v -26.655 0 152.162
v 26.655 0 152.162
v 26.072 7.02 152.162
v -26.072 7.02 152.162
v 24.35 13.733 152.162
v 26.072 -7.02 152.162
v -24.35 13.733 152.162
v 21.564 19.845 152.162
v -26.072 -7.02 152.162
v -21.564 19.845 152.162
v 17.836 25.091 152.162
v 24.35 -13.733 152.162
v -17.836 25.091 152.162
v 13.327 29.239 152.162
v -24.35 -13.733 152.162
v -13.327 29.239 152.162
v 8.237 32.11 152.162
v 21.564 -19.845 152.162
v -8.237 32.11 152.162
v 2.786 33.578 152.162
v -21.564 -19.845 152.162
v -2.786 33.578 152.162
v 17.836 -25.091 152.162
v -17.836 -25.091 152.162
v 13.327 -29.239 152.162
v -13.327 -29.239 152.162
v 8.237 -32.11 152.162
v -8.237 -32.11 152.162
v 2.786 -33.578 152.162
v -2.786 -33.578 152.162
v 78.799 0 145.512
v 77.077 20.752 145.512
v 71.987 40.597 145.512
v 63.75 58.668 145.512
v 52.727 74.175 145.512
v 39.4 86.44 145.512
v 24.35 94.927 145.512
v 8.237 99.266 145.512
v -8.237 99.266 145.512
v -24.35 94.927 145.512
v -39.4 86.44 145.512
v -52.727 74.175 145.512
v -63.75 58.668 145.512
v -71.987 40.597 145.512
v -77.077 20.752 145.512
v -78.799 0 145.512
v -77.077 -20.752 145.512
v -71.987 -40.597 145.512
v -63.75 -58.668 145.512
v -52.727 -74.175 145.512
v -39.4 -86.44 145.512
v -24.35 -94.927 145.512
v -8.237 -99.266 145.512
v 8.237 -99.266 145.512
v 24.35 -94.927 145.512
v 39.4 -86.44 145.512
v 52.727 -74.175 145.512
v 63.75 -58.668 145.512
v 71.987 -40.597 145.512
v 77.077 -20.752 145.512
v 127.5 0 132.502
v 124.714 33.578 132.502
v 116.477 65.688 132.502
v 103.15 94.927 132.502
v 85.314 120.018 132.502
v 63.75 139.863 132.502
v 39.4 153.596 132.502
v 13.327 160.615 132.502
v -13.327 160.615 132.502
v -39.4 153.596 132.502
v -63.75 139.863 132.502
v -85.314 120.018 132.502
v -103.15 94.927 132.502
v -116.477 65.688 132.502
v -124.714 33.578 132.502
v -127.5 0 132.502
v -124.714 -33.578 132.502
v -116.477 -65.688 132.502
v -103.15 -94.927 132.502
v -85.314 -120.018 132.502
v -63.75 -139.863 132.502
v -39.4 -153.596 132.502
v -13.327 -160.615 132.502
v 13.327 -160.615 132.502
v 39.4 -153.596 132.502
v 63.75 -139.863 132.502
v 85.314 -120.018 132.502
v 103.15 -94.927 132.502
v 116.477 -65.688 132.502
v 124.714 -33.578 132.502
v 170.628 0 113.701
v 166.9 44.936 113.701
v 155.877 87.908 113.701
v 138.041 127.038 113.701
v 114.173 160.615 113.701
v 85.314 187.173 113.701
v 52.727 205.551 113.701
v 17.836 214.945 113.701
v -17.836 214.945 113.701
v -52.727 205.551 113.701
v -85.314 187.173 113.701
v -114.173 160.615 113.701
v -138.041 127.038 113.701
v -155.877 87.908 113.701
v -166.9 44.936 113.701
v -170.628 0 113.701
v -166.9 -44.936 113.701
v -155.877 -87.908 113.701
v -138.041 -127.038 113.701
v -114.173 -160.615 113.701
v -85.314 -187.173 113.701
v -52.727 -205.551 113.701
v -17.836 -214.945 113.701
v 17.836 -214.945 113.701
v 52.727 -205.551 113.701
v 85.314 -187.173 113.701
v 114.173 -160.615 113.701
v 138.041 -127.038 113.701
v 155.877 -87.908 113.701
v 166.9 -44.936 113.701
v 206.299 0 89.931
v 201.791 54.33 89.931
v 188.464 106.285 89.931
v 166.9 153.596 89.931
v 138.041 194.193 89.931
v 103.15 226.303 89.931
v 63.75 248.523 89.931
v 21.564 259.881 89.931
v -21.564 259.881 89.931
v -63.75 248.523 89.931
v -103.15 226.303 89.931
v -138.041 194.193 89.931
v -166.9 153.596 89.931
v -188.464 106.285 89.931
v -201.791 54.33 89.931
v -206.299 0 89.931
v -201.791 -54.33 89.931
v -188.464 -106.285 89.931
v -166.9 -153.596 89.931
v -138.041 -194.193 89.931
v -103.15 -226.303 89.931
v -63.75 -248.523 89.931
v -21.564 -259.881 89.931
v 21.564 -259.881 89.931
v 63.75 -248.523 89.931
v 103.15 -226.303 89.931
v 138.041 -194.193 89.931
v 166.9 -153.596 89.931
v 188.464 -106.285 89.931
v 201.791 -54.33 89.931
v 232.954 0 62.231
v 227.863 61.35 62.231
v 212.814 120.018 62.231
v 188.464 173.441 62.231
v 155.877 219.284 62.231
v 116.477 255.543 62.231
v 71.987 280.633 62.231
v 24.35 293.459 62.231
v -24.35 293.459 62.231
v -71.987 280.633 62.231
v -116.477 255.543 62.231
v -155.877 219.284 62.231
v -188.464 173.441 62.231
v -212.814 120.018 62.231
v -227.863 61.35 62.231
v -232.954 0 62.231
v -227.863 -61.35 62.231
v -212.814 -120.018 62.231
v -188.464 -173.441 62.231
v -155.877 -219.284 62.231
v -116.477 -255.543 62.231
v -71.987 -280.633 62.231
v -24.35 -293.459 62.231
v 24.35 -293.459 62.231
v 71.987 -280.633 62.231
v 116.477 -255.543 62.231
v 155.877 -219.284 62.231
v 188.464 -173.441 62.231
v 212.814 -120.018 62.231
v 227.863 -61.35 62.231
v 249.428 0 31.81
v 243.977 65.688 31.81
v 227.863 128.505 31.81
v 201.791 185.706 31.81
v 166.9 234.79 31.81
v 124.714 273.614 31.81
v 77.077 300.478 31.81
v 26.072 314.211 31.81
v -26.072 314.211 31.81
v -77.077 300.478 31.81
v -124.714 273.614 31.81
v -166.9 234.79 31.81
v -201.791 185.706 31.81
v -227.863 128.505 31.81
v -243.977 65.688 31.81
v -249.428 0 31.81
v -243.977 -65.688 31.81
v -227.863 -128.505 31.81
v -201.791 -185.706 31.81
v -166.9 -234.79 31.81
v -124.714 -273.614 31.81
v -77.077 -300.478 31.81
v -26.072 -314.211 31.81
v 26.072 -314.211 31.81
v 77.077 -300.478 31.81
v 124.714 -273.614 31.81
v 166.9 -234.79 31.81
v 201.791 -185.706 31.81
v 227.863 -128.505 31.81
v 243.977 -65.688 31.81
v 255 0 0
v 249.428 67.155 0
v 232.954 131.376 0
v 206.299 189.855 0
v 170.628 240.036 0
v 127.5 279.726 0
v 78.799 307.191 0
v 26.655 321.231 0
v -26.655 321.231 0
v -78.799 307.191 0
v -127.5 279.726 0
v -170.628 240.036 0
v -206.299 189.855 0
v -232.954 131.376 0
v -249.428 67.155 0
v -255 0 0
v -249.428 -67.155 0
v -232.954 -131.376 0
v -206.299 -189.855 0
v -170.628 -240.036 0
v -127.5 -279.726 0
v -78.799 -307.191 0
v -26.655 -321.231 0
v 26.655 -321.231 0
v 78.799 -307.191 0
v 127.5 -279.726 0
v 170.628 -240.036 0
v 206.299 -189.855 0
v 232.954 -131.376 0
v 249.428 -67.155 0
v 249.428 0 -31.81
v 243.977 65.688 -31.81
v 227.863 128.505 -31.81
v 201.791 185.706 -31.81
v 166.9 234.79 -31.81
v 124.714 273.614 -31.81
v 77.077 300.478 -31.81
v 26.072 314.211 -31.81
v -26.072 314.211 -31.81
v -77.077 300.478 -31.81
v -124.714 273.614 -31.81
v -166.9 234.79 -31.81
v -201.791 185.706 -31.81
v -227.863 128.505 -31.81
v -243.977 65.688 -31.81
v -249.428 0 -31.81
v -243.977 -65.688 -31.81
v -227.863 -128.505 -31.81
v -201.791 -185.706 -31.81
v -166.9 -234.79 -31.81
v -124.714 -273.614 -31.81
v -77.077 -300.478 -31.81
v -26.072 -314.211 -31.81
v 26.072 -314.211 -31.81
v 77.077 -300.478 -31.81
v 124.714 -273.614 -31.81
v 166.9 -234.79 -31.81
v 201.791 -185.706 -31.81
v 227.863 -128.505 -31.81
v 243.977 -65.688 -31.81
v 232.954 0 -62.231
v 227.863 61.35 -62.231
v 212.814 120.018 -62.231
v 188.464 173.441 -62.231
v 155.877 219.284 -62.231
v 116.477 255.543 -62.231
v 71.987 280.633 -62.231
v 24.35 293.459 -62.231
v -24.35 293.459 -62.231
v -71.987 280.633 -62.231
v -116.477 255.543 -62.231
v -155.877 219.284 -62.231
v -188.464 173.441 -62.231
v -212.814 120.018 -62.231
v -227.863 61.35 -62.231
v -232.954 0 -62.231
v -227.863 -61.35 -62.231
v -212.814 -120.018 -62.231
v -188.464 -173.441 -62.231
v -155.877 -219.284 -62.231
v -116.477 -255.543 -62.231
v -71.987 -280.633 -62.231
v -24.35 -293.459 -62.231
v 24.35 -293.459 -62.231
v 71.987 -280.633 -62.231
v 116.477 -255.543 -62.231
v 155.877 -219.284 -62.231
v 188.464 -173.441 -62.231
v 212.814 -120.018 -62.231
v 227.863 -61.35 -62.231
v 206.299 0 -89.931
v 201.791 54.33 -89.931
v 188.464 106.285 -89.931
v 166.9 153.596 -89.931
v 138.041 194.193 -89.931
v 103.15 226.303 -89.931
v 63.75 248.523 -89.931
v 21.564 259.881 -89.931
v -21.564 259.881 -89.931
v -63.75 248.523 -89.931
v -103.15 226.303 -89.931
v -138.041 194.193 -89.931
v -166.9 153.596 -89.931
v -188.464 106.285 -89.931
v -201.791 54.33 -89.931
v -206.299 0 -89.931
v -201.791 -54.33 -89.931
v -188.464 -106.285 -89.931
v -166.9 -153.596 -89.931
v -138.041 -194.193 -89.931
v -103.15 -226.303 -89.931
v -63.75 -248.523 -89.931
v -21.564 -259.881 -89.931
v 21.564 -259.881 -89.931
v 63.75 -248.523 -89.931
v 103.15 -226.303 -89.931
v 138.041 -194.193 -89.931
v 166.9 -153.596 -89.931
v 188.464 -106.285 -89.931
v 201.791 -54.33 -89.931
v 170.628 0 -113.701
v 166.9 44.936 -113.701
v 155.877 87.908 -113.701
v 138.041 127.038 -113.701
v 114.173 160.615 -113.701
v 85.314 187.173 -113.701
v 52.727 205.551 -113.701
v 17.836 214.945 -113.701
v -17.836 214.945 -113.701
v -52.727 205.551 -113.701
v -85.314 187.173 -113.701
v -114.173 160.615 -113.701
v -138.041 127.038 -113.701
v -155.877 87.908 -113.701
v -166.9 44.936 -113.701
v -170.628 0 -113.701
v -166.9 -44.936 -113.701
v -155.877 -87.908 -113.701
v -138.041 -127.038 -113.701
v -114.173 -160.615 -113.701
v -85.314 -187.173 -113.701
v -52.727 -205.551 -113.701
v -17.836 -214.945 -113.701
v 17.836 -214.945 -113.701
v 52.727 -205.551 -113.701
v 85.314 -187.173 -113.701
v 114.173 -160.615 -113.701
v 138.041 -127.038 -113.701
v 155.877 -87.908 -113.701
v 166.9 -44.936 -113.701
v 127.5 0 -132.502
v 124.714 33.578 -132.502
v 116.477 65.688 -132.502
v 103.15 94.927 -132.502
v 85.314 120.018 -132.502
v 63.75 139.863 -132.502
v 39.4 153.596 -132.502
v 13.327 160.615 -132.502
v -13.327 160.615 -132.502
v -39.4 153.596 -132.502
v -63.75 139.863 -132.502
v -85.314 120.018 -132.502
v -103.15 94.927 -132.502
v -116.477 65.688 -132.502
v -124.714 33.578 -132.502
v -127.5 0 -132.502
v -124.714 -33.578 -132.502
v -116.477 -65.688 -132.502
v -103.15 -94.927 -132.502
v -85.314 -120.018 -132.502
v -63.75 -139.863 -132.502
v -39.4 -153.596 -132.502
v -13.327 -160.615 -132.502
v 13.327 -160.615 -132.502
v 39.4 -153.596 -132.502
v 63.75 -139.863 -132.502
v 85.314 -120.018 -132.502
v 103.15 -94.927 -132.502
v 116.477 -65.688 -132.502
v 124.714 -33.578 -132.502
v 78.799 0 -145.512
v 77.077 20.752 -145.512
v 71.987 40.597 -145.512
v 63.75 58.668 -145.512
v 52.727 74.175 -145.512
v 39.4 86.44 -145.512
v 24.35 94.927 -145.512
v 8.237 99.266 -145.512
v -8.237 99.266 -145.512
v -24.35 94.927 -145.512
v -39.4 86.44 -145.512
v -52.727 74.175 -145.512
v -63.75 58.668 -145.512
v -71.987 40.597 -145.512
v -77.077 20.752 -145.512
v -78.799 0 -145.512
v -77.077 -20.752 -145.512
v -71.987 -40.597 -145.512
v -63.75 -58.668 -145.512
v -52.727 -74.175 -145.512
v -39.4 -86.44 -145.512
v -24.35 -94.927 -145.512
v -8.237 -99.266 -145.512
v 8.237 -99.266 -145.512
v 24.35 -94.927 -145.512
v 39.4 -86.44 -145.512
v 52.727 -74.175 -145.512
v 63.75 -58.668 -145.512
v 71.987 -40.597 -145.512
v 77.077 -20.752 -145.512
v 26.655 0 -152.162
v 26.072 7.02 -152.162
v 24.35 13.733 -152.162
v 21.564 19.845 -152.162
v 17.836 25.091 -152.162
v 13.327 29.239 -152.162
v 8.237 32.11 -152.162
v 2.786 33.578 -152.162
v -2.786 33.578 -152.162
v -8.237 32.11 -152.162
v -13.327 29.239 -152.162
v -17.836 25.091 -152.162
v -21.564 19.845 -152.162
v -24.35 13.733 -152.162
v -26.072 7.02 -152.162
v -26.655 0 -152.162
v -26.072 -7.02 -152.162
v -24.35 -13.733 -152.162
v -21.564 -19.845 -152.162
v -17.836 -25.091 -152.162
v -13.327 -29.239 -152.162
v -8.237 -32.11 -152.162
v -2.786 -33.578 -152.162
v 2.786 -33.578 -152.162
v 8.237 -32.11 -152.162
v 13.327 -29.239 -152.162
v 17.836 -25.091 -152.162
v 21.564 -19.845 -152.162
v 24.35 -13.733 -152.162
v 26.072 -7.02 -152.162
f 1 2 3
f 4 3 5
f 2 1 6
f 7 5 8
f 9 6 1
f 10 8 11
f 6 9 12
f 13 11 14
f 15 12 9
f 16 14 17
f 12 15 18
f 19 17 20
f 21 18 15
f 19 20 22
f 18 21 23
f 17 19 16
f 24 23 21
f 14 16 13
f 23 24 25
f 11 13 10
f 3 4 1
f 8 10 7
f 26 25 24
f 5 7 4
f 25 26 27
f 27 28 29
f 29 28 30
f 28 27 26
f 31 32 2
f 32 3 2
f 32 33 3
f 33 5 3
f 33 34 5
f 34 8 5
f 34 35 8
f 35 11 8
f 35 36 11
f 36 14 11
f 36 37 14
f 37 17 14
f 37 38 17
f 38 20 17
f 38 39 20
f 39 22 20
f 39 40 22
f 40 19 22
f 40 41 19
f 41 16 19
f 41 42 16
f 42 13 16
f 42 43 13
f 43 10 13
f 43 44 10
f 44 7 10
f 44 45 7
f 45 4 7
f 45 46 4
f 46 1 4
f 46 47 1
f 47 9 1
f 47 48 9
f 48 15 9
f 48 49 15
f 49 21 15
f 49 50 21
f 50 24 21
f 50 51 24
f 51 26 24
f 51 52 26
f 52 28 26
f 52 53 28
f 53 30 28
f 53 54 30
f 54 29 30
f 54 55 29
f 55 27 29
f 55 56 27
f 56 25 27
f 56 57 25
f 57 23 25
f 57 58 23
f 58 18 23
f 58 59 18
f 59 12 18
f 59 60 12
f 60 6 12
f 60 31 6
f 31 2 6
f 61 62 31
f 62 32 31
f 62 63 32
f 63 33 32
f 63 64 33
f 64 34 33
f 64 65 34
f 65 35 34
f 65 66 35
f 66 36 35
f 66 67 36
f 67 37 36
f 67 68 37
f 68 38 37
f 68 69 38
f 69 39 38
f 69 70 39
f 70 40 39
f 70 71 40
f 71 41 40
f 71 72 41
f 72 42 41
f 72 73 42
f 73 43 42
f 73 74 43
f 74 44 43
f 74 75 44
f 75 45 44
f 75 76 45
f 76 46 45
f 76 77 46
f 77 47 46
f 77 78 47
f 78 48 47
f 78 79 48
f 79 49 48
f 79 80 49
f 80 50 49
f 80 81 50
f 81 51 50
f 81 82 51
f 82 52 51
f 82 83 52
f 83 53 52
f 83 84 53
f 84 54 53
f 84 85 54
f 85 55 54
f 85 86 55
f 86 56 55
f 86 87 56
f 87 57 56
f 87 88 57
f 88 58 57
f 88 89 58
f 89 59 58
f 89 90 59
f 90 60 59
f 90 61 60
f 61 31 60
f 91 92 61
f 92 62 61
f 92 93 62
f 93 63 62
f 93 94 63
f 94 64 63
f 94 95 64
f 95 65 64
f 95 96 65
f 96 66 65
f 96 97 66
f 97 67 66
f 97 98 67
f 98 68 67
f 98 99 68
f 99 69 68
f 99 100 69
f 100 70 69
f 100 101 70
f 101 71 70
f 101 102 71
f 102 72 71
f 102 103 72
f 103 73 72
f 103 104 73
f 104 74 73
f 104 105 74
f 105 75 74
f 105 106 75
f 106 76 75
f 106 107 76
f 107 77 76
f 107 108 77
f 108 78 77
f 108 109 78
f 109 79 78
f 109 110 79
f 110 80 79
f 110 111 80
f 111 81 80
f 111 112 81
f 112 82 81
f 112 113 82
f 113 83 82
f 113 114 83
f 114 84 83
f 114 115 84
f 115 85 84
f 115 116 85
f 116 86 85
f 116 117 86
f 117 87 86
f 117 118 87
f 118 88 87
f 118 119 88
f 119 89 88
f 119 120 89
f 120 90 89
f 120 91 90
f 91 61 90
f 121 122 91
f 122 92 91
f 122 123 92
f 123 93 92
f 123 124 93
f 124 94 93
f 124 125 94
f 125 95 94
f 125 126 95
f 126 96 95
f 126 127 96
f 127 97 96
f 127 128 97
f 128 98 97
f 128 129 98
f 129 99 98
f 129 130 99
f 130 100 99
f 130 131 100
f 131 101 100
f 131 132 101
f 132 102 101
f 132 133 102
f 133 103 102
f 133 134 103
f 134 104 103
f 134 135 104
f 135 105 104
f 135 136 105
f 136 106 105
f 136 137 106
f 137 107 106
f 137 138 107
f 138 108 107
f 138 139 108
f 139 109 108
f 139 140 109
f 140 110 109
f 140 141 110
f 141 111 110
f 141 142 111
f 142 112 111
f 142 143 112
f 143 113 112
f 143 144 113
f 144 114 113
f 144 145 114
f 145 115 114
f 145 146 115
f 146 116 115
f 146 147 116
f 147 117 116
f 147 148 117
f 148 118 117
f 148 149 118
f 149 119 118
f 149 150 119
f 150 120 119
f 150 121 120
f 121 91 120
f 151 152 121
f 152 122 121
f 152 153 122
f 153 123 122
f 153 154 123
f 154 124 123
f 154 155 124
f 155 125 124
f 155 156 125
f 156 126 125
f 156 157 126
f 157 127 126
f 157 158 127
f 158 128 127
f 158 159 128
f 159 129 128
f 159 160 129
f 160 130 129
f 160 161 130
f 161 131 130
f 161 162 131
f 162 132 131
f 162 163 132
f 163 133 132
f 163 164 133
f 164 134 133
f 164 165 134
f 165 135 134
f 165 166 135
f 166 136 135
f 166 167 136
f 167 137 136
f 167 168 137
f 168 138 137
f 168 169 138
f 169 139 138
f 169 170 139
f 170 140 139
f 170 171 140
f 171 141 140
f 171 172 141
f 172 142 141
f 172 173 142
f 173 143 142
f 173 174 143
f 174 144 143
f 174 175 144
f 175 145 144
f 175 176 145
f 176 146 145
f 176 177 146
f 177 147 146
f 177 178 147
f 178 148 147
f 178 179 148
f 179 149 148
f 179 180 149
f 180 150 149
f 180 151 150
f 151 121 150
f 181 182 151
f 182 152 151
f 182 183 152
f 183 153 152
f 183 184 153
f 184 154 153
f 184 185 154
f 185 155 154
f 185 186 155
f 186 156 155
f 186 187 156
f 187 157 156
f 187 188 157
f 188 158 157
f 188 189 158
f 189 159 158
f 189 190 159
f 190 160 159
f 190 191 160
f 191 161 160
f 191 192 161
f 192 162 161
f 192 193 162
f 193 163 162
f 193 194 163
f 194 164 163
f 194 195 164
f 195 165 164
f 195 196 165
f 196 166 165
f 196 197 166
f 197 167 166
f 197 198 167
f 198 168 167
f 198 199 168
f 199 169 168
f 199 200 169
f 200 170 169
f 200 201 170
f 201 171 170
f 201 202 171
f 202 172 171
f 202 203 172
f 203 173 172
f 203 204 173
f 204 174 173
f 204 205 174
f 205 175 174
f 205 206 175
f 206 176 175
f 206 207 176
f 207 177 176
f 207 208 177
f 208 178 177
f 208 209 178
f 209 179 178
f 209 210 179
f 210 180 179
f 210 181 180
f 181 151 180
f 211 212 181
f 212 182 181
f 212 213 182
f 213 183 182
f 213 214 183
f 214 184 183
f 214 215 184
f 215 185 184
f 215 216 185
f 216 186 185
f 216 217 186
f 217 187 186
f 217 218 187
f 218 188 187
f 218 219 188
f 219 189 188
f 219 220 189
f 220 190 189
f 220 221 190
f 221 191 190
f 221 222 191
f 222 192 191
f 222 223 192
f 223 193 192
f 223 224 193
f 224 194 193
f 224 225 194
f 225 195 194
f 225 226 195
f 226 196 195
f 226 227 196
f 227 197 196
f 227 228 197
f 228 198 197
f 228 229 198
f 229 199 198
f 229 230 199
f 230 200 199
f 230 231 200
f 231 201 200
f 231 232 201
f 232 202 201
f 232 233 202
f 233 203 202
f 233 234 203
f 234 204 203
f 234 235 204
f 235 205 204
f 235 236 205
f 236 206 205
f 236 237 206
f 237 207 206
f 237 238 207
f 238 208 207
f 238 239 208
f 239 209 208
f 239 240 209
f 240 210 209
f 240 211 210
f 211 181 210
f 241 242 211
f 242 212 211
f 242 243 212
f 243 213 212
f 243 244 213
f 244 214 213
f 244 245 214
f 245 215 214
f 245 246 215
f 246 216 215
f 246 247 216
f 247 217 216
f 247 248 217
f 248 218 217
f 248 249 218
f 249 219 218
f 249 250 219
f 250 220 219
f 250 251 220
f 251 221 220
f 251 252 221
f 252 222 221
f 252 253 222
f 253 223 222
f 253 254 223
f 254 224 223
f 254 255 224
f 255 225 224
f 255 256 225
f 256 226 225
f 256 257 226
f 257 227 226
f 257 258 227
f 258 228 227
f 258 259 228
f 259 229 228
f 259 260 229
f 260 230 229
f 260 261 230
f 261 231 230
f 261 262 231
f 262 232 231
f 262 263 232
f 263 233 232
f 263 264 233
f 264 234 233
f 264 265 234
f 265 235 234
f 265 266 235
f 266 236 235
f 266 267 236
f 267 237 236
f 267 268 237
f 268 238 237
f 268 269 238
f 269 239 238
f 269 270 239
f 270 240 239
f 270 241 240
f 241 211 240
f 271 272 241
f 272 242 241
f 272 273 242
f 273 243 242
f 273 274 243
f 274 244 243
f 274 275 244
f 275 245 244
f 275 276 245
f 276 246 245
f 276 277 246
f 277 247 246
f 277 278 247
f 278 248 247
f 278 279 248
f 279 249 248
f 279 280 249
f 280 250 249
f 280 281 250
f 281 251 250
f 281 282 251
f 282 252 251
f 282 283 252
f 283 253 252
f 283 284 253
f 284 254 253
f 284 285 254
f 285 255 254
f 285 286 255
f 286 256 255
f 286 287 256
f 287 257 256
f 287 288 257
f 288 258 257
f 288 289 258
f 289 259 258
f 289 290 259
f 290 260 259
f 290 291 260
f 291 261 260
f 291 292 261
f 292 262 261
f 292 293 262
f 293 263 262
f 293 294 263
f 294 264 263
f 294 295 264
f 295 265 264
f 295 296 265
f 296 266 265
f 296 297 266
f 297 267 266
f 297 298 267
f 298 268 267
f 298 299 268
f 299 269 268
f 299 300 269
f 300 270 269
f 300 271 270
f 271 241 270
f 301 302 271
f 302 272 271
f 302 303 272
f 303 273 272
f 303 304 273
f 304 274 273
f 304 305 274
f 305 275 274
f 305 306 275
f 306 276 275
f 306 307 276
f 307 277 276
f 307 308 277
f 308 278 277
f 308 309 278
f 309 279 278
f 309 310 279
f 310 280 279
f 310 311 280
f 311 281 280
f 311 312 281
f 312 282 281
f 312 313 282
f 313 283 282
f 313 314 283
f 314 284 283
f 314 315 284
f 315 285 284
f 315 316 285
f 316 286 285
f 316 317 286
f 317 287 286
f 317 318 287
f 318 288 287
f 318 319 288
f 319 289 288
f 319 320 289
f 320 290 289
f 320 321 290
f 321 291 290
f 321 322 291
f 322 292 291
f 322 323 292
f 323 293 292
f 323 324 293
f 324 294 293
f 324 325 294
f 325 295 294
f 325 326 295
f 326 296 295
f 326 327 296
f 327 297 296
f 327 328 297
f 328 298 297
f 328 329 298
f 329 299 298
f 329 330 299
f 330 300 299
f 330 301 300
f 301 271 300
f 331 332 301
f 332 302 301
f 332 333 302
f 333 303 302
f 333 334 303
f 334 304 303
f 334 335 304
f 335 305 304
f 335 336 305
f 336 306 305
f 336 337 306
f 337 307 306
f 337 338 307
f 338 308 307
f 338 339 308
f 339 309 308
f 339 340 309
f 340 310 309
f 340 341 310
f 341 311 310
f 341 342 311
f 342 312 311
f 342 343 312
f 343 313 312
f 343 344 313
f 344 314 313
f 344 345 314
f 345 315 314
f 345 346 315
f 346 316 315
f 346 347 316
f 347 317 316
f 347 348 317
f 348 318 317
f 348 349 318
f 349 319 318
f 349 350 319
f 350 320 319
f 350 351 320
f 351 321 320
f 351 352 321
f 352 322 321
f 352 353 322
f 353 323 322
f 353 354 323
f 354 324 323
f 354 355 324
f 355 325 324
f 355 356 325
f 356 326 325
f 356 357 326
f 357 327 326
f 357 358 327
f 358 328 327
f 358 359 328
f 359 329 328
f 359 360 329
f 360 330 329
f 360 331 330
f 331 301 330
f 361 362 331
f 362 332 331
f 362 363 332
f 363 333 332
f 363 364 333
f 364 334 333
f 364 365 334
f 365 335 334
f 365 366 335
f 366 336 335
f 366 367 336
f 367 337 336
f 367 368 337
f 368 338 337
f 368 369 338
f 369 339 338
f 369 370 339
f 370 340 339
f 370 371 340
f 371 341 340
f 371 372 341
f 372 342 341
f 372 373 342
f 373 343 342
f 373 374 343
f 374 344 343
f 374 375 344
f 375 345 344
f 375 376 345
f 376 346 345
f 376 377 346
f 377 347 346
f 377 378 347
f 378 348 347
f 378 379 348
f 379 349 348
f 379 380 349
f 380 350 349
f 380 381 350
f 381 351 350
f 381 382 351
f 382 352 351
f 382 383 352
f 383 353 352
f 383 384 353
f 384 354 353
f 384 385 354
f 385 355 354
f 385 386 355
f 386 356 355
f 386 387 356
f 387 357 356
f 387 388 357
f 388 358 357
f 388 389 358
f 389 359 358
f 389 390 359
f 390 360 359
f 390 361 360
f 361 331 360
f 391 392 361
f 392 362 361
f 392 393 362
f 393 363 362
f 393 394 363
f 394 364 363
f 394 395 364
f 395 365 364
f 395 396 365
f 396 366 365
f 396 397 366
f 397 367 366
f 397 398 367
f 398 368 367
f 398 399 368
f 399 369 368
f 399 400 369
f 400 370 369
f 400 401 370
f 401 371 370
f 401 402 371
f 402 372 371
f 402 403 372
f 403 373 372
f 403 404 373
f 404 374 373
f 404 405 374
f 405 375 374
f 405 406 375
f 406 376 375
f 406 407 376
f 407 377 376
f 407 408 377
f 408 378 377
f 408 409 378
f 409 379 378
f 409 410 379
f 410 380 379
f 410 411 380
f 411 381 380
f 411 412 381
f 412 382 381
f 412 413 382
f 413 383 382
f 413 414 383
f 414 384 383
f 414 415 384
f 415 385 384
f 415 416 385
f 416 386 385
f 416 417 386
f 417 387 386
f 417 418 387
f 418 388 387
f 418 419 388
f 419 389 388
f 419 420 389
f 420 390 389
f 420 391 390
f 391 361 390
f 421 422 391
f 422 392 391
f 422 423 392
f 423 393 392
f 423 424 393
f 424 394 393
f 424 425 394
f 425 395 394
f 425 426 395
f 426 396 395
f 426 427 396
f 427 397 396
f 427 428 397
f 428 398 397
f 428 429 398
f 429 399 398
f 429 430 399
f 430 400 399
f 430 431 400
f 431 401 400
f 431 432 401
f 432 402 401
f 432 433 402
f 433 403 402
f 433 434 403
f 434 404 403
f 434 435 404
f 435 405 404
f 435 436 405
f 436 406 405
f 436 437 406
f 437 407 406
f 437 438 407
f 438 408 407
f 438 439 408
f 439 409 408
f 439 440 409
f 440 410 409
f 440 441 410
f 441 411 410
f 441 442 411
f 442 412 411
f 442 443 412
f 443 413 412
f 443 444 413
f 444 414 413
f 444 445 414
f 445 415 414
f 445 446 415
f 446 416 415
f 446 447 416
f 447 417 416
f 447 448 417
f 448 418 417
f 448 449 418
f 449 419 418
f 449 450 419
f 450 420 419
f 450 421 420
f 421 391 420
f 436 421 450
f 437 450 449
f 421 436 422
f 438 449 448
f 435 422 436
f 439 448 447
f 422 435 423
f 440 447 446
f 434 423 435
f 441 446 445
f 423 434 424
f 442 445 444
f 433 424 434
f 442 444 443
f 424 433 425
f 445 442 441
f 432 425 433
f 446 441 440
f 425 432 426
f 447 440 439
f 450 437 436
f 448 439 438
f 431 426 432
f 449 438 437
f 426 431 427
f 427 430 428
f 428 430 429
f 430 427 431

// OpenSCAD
// Generated by SolidPython 1.0.1 on 2020-07-29 00:46:52


scale(v = [15, 19, 9]) {
	sphere(r = 17);
}
/***********************************************
*********      SolidPython code:      **********
************************************************
 
# import packages: SolidPython
from solid import *
from solid.utils import *
from itertools import chain, combinations, permutations


class Resize:

    def __init__(self, scad_file):
        self.scad_file = scad_file
        #self.scad_file = import_scad(scad_file)
        # cone/cylinder param:
        self.r1 = 0
        self.r2 = 0
        self.h = 0
        # rectangular prism param:
        self.w = 0
        self.l = 0
        # ellipse param:
        self.r = 0

    # import OpenScad code (file name corresponds to shape)


    # classify shape + parameters
    def assign(self, param1, param2, param3):
        if self.scad_file == 'cone.scad':
            self.r1 = param1
            self.r2 = param2
            self.h = param3
        elif self.scad_file == 'cylinder.scad':
            self.r1 = param1
            self.r2 = param2
            self.h = param3
        elif self.scad_file == 'rectangularPrism.scad':
            self.h = param1
            self.l = param2
            self.w = param3
        else:
            self.r = param1
            self.h = param2

    # resize parameters
    def iterate(self):
        x = range(3, 20, 2)
        i = 1
        if self.scad_file == 'cone.scad':
            tempList = list(permutations(x, 2))
            for temp in tempList:
                param1 = temp[0]
                param2 = temp[1]
                filepath = 'produced_scad_files/' + 'cone' + str(param1) + '_' + str(param2) + '_' + '.scad'
                scad_render_to_file(cylinder(h=param1, r1=param2, r2=0), filepath)

        elif self.scad_file == 'cylinder.scad':
            tempList = list(permutations(x, 3))
            for temp in tempList:
                param1 = temp[0]
                param2 = temp[1]
                filepath = 'produced_scad_files/' + 'cylinder' + str(param1) + '_' + str(param2) + '_' + '.scad'
                scad_render_to_file(cylinder(h=param1, r1=param2, r2=param2), filepath)

        elif self.scad_file == 'rectangularPrism.scad':
            tempList = list(permutations(x, 3))
            for temp in tempList:
                param1 = temp[0]
                param2 = temp[1]
                param3 = temp[2]
                filepath = 'produced_scad_files/' + 'rectangularPrism' + str(param1) + '_' + str(param2) + '_' + str(
                    param3) + '.scad'
                scad_render_to_file(cube(size=(param1, param2, param3)), filepath)

        elif self.scad_file == 'ellipse.scad':
            tempList = list(permutations(x, 4))
            for temp in tempList:
                param1 = temp[0]
                param2 = temp[1]
                param3 = temp[2]
                param4 = temp[3]
                filepath = 'produced_scad_files/' + 'ellipse' + str(param1) + '_' + str(param2) + '_' + str(param3) + '_' + str(param4) + '.scad'
                scad_render_to_file(scale([param1, param2, param3])(sphere(r=param4)), filepath)

    def render_to_scadfile(self):
        scad_render_to_file(scad, 'example.scad') 
 
************************************************/
